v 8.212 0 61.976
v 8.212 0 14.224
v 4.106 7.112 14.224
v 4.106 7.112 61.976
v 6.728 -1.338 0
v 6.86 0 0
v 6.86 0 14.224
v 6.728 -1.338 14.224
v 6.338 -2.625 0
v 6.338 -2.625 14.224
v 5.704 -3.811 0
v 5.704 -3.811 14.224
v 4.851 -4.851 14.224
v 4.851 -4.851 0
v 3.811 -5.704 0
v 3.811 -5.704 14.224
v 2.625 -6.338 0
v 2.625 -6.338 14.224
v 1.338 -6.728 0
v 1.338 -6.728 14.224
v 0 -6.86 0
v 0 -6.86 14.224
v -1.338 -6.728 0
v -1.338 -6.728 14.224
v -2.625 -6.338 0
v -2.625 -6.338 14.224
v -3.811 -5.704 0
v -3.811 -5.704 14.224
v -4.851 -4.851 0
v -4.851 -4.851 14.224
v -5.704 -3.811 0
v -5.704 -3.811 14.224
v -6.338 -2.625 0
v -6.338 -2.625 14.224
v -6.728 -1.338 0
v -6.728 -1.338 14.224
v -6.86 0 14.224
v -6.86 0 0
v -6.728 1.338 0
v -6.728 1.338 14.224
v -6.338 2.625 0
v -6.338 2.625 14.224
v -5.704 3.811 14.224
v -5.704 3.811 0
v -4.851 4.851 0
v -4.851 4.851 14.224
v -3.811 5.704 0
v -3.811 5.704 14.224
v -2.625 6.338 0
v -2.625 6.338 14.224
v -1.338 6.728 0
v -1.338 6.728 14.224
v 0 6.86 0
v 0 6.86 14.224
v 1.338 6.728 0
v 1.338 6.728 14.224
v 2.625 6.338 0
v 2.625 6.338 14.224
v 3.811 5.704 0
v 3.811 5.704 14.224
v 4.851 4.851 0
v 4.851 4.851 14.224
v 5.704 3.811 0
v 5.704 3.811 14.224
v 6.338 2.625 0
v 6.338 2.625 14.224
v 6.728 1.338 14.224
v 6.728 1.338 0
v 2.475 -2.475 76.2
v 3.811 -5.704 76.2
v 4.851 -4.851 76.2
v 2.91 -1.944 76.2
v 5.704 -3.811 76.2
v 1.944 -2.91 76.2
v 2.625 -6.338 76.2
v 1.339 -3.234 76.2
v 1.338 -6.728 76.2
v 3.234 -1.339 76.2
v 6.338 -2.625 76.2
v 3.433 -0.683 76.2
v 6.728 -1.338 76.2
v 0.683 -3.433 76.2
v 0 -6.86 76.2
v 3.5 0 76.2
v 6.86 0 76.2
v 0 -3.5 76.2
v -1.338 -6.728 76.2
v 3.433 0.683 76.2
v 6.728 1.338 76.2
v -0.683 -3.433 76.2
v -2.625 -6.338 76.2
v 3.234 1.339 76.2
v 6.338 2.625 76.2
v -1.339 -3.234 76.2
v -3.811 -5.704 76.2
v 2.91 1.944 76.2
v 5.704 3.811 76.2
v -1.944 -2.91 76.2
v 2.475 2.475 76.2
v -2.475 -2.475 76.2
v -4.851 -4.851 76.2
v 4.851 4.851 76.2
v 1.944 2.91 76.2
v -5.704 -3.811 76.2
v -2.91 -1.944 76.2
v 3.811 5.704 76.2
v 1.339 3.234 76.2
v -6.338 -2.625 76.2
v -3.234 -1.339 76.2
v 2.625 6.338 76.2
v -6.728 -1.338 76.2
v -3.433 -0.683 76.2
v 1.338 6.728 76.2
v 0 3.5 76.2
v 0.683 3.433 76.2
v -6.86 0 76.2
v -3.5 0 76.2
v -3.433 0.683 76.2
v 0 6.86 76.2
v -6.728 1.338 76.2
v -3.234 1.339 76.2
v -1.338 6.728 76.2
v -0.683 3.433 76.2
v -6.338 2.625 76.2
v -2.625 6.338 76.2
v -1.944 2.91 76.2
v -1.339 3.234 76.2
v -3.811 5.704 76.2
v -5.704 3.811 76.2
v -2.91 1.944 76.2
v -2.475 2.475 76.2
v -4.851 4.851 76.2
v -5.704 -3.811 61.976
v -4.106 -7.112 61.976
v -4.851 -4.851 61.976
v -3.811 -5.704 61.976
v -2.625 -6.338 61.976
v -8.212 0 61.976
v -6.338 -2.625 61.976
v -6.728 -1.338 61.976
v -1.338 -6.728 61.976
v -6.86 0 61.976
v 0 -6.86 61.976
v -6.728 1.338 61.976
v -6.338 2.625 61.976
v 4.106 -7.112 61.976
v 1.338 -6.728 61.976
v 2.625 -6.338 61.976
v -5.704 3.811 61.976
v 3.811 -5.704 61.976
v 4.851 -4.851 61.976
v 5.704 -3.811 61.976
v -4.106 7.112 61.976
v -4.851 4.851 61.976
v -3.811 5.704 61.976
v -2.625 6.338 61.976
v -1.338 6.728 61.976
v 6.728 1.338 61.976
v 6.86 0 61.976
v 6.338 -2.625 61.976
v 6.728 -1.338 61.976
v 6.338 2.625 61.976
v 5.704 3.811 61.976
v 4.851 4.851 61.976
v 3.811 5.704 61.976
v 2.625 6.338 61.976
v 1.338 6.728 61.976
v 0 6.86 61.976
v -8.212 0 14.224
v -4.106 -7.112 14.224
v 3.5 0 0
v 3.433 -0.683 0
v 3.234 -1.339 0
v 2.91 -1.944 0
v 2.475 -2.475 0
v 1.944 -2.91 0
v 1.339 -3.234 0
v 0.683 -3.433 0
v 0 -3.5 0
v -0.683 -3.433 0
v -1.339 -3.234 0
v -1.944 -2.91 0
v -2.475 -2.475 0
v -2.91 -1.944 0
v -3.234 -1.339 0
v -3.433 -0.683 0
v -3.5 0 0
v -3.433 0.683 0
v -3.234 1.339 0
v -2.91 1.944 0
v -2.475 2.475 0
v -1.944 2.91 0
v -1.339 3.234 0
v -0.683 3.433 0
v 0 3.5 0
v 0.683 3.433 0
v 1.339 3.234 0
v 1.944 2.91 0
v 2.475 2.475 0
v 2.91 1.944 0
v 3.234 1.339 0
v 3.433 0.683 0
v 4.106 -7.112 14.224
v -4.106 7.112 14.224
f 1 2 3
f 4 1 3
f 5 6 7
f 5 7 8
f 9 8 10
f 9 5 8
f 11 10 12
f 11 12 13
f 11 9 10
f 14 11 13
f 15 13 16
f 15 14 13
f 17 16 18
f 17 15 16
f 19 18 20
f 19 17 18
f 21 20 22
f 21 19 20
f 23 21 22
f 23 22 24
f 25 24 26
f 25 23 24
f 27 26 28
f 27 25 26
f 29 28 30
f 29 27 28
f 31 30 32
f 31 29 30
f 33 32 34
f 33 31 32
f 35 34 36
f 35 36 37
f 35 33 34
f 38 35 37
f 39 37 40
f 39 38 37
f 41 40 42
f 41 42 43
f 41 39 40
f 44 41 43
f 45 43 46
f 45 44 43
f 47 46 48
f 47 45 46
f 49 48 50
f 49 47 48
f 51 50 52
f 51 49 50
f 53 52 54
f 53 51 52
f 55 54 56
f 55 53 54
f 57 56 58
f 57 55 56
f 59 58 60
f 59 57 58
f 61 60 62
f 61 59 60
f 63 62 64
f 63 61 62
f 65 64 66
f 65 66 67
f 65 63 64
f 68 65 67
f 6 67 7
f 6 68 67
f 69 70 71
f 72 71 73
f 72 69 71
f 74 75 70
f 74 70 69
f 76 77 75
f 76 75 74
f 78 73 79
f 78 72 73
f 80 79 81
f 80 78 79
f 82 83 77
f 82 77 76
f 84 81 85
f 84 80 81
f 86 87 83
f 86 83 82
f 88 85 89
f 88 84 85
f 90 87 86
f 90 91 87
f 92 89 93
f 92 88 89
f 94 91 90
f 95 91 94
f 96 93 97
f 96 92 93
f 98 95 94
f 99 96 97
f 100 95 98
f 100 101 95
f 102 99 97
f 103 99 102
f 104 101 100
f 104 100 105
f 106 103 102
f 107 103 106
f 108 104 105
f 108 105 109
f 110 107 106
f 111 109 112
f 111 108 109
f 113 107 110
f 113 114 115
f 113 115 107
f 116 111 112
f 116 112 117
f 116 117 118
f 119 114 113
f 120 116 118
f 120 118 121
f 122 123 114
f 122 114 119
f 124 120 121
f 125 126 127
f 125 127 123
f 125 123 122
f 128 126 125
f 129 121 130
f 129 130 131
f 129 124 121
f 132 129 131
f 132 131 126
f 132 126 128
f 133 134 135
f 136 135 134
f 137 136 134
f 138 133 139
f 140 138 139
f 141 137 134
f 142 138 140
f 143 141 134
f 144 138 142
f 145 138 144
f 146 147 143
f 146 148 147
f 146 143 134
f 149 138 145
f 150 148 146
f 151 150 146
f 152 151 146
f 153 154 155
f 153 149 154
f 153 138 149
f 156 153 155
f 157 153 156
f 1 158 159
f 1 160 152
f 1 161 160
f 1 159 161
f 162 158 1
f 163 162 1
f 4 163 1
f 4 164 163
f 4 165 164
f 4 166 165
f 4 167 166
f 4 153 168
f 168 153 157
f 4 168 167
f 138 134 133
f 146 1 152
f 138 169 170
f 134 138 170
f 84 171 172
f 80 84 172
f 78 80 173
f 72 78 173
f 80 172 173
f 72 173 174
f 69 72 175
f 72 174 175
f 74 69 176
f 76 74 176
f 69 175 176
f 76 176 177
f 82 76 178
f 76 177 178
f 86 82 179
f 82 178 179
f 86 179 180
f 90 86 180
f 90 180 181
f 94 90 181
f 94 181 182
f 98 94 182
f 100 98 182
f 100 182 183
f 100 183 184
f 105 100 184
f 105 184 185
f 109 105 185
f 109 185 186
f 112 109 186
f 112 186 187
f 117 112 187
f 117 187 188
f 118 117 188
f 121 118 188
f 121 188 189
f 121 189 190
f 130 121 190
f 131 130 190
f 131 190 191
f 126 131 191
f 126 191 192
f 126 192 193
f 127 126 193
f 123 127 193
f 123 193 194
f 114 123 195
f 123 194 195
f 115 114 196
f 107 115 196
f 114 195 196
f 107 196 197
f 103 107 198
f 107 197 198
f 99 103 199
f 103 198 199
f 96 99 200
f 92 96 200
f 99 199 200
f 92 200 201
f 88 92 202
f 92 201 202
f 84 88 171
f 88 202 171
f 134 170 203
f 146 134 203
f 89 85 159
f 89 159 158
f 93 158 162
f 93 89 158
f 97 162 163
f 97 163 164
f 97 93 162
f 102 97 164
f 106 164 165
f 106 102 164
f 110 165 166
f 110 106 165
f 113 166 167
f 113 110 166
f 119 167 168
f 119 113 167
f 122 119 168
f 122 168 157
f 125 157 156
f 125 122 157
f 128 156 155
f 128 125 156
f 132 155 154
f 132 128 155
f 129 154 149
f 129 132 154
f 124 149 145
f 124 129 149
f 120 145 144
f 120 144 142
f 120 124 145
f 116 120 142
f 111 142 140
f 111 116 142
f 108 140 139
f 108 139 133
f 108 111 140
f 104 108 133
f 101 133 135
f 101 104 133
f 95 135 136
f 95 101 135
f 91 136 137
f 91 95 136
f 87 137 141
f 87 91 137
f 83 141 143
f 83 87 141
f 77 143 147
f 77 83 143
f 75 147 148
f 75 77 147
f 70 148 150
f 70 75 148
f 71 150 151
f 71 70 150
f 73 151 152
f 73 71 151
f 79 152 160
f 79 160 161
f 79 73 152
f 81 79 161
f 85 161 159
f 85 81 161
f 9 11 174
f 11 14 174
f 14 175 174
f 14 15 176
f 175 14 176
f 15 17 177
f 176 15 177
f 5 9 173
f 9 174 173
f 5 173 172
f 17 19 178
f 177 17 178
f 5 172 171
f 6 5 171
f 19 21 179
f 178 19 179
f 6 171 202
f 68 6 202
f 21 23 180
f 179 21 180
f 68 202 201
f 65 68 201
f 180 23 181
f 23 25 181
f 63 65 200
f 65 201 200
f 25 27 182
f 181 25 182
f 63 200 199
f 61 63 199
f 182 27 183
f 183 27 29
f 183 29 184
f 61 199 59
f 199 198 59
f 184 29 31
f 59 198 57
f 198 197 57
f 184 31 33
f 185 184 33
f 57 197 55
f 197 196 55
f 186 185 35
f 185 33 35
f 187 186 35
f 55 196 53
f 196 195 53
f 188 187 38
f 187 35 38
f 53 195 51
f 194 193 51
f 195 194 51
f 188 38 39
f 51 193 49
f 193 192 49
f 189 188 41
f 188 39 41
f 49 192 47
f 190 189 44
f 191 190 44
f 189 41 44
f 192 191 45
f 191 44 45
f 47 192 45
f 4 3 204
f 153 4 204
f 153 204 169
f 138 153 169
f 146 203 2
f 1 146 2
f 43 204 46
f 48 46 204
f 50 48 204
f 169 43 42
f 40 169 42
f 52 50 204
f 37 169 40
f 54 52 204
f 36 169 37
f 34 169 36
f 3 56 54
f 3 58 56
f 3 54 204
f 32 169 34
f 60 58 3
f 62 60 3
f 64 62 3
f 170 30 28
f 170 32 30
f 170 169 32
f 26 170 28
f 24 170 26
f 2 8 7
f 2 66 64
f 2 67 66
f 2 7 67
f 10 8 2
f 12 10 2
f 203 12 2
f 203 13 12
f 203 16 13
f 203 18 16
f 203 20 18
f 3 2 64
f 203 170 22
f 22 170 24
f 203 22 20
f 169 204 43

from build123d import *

# Parameters (mm, degrees)
BOSS_EXTRUDE1_DEPTH = 76.2
SKETCH2_R           = 6.86
CUT_EXTRUDE1_DEPTH  = 14.224
SKETCH3_R           = 6.86
CUT_EXTRUDE2_DEPTH  = 14.224
SKETCH4_R           = 3.5
CUT_EXTRUDE3_DEPTH  = 77.2


with BuildPart() as part:
    # Sketch1 → Boss-Extrude1 (new body)
    with BuildSketch(Plane(origin=(0, 0, 0), x_dir=(0, 1, 0), z_dir=(0, 0, 1))):
        Polygon((7.112, -4.106115114), (7.112, 4.106115114), (0, 8.212230229), (-7.112, 4.106115114), (-7.112, -4.106115114), (0, -8.212230229), align=None)
    extrude(amount=BOSS_EXTRUDE1_DEPTH)

    # Sketch2 → Cut-Extrude1 (cut)
    with BuildSketch(Plane.XY.offset(76.2)):
        Polygon((8.212230229, 0), (4.106115114, 7.112), (-4.106115114, 7.112), (-8.212230229, 0), (-4.106115114, -7.112), (4.106115114, -7.112), align=None)
        Circle(SKETCH2_R, mode=Mode.SUBTRACT)
    extrude(amount=-CUT_EXTRUDE1_DEPTH, mode=Mode.SUBTRACT)

    # Sketch3 → Cut-Extrude2 (cut)
    with BuildSketch(Plane(origin=(0, 0, 0), x_dir=(1, 0, 0), z_dir=(0, 0, -1))):
        Polygon((4.106115114, -7.112), (8.212230229, 0), (4.106115114, 7.112), (-4.106115114, 7.112), (-8.212230229, 0), (-4.106115114, -7.112), align=None)
        Circle(SKETCH3_R, mode=Mode.SUBTRACT)
    extrude(amount=-CUT_EXTRUDE2_DEPTH, mode=Mode.SUBTRACT)

    # Sketch4 → Cut-Extrude3 (cut, through all)
    with BuildSketch(Plane(origin=(0, 0, 0), x_dir=(1, 0, 0), z_dir=(0, 0, -1))):
        Circle(SKETCH4_R)
    extrude(amount=-CUT_EXTRUDE3_DEPTH, mode=Mode.SUBTRACT)


solid = part.part
